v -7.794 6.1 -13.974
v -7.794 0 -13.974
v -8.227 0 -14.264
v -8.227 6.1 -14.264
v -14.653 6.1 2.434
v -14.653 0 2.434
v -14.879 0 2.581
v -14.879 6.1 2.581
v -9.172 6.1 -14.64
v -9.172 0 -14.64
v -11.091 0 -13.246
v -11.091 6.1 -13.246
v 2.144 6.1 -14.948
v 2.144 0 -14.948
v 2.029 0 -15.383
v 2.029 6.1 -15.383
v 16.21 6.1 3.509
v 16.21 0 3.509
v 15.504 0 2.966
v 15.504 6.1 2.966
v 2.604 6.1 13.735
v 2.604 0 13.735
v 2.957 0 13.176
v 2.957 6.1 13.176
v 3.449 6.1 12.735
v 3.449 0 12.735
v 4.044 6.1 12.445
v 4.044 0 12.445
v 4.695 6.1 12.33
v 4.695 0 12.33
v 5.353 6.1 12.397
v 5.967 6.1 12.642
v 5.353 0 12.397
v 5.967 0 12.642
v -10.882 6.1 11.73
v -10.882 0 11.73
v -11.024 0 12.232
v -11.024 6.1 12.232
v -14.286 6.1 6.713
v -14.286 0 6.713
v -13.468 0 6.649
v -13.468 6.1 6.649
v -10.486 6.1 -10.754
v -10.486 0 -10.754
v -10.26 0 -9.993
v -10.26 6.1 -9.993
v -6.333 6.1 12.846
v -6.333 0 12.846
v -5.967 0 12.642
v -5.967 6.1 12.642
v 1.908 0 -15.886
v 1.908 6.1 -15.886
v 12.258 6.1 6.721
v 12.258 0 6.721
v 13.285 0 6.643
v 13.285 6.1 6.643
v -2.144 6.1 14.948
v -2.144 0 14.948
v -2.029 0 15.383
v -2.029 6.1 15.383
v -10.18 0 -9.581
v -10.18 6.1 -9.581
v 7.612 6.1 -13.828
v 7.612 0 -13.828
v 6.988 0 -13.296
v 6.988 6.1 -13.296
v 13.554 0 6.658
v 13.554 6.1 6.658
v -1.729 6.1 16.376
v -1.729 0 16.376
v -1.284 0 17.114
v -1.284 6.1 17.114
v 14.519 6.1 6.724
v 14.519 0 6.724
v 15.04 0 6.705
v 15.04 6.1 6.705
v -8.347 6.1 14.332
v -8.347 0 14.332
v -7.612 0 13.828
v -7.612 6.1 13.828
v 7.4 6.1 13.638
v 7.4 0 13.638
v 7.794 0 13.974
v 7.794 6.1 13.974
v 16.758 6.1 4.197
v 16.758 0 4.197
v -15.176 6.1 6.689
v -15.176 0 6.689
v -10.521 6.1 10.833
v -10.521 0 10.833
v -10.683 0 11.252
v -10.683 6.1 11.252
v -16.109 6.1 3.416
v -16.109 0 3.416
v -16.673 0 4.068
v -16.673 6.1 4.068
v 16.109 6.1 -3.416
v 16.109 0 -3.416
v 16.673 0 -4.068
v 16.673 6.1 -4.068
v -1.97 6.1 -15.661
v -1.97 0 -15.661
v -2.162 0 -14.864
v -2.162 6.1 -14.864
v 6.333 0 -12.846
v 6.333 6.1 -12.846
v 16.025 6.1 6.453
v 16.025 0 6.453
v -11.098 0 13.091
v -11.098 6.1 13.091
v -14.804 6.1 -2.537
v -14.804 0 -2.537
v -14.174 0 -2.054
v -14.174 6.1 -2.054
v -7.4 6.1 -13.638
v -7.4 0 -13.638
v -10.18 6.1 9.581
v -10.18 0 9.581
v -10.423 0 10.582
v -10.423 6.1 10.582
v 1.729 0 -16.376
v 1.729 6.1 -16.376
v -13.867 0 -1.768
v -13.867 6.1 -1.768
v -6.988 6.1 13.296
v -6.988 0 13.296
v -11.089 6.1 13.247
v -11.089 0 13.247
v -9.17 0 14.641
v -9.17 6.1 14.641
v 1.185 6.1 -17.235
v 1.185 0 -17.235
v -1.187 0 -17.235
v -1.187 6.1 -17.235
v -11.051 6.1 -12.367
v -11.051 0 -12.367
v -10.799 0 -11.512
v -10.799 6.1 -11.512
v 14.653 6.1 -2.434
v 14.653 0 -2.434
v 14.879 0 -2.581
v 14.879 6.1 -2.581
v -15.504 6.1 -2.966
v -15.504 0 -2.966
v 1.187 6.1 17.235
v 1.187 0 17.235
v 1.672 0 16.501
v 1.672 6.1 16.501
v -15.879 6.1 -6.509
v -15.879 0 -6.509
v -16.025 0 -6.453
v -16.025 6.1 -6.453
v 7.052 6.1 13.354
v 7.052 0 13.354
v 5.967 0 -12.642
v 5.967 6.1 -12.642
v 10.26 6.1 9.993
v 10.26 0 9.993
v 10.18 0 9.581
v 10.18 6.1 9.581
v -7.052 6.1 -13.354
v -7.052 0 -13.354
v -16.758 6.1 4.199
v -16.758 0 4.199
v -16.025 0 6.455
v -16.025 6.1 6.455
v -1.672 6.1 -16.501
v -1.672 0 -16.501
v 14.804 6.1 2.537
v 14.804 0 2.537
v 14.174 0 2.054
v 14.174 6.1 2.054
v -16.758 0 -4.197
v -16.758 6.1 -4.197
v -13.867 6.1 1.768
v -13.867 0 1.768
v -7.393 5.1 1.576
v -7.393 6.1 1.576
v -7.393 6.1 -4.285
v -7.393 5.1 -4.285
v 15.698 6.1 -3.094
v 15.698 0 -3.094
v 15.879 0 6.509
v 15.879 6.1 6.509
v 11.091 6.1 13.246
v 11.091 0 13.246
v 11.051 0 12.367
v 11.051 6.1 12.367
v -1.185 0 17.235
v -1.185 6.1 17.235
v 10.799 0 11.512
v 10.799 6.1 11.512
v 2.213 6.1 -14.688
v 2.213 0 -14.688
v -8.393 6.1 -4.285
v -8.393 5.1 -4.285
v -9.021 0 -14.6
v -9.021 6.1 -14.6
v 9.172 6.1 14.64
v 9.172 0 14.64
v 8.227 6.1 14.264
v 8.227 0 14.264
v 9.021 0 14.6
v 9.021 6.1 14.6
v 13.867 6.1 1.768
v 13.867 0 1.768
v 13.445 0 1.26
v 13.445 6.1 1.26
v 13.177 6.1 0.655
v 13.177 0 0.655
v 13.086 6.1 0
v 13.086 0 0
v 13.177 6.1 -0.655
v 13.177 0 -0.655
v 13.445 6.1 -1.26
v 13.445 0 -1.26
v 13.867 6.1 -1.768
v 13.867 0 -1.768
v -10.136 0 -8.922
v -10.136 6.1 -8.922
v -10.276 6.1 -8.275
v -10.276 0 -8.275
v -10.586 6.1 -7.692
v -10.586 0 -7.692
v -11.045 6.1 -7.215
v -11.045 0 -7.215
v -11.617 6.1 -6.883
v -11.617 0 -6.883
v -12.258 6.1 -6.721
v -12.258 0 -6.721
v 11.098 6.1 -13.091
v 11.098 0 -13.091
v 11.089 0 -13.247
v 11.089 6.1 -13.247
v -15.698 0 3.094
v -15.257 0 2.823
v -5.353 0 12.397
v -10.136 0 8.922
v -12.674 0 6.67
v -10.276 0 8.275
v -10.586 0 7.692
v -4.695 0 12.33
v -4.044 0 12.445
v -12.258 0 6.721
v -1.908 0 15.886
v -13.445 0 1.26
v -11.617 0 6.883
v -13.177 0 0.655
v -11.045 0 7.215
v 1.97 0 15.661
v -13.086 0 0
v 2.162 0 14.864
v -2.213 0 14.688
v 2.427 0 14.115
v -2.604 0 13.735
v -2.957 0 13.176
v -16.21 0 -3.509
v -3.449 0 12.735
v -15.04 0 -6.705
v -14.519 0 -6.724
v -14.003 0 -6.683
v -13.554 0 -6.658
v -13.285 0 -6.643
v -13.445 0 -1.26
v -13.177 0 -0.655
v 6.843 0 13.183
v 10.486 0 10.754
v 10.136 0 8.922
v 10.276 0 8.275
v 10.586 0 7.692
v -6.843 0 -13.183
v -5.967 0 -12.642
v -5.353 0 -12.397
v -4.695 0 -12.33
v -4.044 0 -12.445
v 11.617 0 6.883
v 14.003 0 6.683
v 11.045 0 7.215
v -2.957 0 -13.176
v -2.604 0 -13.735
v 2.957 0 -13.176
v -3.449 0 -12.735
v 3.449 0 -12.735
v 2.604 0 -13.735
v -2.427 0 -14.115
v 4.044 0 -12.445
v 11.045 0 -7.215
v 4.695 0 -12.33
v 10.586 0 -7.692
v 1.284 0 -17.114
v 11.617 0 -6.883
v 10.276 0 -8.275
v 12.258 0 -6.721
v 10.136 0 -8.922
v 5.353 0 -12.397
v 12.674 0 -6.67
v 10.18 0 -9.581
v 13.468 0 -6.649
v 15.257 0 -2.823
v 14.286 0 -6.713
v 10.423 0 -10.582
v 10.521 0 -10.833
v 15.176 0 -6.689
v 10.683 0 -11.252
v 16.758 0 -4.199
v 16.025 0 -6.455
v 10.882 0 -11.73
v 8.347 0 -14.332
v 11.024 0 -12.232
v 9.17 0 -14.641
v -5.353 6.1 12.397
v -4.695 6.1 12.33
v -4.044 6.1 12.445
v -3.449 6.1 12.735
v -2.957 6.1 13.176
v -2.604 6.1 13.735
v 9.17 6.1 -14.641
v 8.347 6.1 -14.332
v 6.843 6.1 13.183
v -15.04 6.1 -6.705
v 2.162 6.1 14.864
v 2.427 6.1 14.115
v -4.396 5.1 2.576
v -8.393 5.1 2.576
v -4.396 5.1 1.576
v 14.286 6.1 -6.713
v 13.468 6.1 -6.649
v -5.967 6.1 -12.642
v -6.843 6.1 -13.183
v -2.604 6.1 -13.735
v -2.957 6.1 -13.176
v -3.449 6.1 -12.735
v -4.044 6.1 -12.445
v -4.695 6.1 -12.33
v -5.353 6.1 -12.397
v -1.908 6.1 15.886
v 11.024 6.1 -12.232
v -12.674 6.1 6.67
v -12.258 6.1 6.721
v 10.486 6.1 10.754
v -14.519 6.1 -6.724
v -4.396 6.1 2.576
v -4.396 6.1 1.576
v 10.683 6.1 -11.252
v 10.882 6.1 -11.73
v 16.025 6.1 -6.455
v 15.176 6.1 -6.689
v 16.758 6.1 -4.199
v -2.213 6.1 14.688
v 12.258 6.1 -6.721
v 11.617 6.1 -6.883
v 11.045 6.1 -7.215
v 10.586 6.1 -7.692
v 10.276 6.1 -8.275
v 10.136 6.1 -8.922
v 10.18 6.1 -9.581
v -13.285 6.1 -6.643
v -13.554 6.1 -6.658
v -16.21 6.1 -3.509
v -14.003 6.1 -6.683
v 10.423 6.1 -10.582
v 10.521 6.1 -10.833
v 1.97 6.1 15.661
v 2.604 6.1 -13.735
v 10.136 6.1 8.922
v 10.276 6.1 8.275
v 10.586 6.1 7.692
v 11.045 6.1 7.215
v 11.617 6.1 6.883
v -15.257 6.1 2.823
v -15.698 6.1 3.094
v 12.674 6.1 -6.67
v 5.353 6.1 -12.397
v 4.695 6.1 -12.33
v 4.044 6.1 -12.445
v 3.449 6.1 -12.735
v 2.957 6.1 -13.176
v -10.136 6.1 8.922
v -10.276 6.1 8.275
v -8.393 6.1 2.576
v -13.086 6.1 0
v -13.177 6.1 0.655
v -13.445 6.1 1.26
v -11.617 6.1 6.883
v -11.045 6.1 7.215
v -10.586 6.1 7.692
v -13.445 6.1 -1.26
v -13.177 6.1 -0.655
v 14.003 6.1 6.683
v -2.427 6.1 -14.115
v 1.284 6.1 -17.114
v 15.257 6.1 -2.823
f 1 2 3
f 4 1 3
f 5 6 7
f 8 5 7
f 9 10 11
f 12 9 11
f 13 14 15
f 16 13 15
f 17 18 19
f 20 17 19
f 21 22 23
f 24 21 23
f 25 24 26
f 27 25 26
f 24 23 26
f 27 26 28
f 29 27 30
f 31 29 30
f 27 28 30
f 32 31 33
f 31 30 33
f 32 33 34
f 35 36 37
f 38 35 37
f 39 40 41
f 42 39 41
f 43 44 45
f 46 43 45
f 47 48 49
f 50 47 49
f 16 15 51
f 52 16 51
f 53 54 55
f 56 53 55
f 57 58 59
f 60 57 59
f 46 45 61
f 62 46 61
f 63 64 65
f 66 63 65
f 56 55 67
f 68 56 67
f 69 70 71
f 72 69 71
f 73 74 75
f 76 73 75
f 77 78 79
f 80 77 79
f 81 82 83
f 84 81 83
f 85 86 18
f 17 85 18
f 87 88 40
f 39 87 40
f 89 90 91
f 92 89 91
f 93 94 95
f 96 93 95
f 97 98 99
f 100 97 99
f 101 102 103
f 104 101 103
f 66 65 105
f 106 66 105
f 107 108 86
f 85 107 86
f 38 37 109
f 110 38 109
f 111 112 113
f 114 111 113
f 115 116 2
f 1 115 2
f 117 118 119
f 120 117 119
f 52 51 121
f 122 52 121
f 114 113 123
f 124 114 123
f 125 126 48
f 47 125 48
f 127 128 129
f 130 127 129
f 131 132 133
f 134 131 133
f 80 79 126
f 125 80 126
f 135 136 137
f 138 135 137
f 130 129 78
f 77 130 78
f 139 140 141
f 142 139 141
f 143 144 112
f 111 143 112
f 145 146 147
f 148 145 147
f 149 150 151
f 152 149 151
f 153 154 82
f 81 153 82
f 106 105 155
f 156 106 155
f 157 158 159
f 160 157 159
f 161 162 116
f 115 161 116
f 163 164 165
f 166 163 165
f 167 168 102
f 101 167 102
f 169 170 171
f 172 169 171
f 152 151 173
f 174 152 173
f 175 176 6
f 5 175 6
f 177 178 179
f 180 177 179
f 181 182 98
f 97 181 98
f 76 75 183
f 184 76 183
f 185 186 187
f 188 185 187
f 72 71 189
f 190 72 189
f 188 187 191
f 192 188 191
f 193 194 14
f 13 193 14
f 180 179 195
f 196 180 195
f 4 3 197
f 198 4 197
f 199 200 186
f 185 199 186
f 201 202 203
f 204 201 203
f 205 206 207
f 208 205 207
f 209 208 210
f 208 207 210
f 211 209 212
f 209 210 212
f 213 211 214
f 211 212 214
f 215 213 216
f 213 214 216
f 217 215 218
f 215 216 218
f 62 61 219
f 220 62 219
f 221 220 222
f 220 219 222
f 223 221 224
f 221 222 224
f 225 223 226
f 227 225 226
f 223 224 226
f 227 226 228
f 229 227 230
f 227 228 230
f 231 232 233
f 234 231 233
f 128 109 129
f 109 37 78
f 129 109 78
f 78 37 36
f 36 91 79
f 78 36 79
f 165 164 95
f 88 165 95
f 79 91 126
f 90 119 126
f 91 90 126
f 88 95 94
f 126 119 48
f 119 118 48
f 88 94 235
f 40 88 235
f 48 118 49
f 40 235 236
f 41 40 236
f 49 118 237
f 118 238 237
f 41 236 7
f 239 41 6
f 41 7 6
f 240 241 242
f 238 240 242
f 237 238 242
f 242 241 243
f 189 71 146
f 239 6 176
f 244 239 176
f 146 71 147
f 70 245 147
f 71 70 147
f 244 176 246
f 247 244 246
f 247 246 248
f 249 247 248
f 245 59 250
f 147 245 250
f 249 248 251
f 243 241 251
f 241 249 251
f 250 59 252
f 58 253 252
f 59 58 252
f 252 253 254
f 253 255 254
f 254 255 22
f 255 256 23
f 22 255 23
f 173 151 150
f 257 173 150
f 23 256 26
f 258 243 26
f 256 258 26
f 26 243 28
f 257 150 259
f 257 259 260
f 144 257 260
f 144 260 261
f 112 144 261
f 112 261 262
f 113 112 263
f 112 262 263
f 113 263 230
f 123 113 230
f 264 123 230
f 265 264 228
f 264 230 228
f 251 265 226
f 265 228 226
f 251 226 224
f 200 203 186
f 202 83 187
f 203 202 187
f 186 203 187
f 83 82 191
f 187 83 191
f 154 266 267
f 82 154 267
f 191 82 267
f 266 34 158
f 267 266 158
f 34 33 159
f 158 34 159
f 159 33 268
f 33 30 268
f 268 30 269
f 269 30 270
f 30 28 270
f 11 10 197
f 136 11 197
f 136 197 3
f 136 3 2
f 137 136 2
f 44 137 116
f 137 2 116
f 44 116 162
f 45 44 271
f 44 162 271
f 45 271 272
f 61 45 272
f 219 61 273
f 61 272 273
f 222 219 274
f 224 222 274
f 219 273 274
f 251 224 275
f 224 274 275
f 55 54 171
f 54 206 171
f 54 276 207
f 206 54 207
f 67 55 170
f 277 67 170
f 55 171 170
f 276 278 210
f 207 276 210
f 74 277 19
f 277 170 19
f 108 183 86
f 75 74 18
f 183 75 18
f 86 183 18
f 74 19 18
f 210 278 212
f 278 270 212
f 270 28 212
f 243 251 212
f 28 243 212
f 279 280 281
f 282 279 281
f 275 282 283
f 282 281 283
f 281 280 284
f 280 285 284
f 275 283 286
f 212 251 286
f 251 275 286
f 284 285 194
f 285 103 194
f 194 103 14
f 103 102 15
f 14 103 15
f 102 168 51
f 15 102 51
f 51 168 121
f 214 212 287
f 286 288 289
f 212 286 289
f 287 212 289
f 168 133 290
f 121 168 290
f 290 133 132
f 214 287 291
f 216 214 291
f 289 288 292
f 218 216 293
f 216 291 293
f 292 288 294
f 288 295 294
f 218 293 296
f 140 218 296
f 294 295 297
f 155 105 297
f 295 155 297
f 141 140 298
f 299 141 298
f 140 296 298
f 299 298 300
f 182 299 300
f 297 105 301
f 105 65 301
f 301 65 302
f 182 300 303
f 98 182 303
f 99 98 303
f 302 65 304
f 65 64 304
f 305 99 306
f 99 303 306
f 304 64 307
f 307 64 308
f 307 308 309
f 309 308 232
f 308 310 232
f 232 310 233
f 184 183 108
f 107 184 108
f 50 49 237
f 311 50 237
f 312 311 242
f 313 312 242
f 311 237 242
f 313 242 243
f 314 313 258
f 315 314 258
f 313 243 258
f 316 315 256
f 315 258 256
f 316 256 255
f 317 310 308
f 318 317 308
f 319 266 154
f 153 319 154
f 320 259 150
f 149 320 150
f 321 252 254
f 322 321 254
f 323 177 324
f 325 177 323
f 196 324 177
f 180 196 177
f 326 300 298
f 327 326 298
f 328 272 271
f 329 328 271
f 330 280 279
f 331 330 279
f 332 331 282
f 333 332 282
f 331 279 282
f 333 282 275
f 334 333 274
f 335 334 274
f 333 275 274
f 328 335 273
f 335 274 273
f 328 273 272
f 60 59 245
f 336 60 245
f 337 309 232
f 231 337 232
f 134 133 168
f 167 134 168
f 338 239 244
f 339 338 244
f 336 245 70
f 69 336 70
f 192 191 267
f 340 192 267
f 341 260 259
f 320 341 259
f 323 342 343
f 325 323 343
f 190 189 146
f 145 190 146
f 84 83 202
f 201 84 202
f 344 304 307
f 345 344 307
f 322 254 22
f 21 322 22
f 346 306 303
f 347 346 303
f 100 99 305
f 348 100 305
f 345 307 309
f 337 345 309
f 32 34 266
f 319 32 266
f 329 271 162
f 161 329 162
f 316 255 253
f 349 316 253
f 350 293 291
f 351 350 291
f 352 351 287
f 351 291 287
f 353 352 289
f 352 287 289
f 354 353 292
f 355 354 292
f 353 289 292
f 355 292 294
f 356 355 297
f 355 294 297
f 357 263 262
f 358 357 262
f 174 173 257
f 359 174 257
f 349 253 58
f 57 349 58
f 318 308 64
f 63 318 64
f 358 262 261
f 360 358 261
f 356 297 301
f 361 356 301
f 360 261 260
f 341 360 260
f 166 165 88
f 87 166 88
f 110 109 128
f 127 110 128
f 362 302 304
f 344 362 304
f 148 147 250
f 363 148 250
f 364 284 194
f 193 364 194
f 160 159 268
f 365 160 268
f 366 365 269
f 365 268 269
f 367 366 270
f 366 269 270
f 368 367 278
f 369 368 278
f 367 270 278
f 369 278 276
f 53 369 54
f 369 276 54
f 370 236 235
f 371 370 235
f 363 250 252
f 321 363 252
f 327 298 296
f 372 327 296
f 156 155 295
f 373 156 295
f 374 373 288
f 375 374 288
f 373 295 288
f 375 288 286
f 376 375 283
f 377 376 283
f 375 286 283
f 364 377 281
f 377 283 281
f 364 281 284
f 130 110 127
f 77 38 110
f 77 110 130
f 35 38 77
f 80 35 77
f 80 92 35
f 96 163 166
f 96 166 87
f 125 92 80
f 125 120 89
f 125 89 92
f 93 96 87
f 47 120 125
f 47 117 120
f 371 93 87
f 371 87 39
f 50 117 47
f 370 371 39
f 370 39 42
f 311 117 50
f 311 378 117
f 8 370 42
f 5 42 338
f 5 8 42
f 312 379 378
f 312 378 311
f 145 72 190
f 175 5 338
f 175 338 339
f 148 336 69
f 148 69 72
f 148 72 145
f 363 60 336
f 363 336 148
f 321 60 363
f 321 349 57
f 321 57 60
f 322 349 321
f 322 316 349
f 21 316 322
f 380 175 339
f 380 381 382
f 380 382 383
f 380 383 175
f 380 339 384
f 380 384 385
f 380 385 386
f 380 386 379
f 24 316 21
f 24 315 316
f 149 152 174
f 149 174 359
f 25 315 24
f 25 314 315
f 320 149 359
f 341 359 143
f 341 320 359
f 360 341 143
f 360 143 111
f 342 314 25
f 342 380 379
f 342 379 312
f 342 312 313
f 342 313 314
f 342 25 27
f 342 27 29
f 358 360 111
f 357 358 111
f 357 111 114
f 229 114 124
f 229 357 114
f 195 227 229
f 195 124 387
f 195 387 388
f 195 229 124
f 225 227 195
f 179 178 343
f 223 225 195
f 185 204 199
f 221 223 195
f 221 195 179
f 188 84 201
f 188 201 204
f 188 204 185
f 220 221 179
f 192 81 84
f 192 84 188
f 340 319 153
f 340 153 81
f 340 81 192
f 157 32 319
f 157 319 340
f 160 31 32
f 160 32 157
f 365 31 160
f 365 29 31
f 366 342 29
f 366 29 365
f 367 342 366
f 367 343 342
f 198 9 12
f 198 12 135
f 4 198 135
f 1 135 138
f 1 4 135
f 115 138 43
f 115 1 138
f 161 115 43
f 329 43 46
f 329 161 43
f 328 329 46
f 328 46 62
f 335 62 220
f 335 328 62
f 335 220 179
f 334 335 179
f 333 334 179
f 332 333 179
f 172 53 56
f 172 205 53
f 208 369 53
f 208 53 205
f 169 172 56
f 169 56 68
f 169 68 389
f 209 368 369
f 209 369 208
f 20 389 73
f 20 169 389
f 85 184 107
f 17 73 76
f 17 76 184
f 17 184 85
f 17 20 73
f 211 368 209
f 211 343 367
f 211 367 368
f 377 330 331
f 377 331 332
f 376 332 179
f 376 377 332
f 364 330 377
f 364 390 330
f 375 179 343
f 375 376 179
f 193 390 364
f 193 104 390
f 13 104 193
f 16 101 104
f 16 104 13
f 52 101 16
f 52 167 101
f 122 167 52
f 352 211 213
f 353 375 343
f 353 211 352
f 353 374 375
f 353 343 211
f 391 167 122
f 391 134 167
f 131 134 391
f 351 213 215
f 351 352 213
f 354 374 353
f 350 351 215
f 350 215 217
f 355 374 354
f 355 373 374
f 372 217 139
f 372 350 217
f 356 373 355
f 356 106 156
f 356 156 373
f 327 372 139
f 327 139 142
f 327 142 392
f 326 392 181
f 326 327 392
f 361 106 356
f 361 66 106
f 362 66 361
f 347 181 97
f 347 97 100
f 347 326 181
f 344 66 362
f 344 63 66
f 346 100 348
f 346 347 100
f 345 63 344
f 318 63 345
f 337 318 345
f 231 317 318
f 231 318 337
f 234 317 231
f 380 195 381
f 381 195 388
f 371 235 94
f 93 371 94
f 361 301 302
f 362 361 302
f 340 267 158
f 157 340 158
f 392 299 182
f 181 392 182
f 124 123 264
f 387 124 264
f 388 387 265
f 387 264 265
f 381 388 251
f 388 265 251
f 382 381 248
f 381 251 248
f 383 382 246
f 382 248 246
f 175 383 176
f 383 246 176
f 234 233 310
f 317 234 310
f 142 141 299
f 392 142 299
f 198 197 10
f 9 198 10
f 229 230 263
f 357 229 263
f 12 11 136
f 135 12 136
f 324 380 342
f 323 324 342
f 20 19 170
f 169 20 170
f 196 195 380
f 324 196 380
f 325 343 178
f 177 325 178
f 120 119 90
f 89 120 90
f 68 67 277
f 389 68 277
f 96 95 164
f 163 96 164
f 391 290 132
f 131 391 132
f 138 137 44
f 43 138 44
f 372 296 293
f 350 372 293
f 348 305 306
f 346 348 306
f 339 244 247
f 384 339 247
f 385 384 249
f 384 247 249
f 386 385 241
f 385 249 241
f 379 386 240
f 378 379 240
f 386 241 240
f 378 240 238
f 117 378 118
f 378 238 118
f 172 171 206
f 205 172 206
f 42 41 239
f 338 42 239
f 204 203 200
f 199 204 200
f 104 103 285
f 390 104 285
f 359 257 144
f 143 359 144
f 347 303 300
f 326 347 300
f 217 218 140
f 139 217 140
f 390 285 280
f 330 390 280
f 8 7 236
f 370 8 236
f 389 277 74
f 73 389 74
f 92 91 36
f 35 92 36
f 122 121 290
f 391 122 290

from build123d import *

# Parameters (mm, degrees)
BOSS_EXTRUDE1_DEPTH = 6.1
CUT_EXTRUDE1_DEPTH  = 1


with BuildPart() as part:
    # Sketch1 → Boss-Extrude1 (new body)
    with BuildSketch(Plane(origin=(0, 0, 0), x_dir=(1, 0, 0), z_dir=(0, 1, 0))):
        with BuildLine():
            ThreePointArc((-2.603734293, 13.735096717), (-4.043681259, 12.445171239), (-5.966821997, 12.642363282))
            Line((-5.966821997, 12.642363282), (-6.843279813, 13.183422247))
            Line((-6.843279813, 13.183422247), (-7.052164592, 13.353548445))
            Line((-7.052164592, 13.353548445), (-7.399861002, 13.637560961))
            Line((-7.399861002, 13.637560961), (-7.793732744, 13.973879308))
            Line((-7.793732744, 13.973879308), (-8.226942264, 14.264456075))
            Line((-8.226942264, 14.264456075), (-9.020650473, 14.599698524))
            Line((-9.020650473, 14.599698524), (-9.172029908, 14.639881345))
            Line((-9.172029908, 14.639881345), (-11.091125587, 13.245576719))
            Line((-11.091125587, 13.245576719), (-11.051137643, 12.366770586))
            Line((-11.051137643, 12.366770586), (-10.799290258, 11.512249619))
            Line((-10.799290258, 11.512249619), (-10.485832024, 10.75420757))
            Line((-10.485832024, 10.75420757), (-10.259959226, 9.993083115))
            Line((-10.259959226, 9.993083115), (-10.179752581, 9.581490045))
            ThreePointArc((-10.179752581, 9.581490045), (-10.586494975, 7.691538822), (-12.258255089, 6.720676771))
            Line((-12.258255089, 6.720676771), (-13.285350838, 6.643233691))
            Line((-13.285350838, 6.643233691), (-13.554339843, 6.658089283))
            Line((-13.554339843, 6.658089283), (-14.002570517, 6.683489414))
            Line((-14.002570517, 6.683489414), (-14.518902414, 6.72406467))
            Line((-14.518902414, 6.72406467), (-15.040173016, 6.704512046))
            Line((-15.040173016, 6.704512046), (-15.879347013, 6.509198904))
            Line((-15.879347013, 6.509198904), (-16.025434419, 6.452728891))
            Line((-16.025434419, 6.452728891), (-16.75846374, 4.196696614))
            Line((-16.75846374, 4.196696614), (-16.20956353, 3.509231842))
            Line((-16.20956353, 3.509231842), (-15.503539893, 2.965942036))
            Line((-15.503539893, 2.965942036), (-14.804380918, 2.536919263))
            Line((-14.804380918, 2.536919263), (-14.174268255, 2.053921344))
            Line((-14.174268255, 2.053921344), (-13.86745138, 1.768079839))
            ThreePointArc((-13.86745138, 1.768079839), (-13.085627432, 0), (-13.86745138, -1.768079839))
            Line((-13.86745138, -1.768079839), (-14.652869395, -2.434444341))
            Line((-14.652869395, -2.434444341), (-14.87921797, -2.580533684))
            Line((-14.87921797, -2.580533684), (-15.256774024, -2.823447927))
            Line((-15.256774024, -2.823447927), (-15.698344841, -3.094114129))
            Line((-15.698344841, -3.094114129), (-16.108568873, -3.416327706))
            Line((-16.108568873, -3.416327706), (-16.672672713, -4.067593457))
            Line((-16.672672713, -4.067593457), (-16.757667666, -4.19914668))
            Line((-16.757667666, -4.19914668), (-16.024638344, -6.455178957))
            Line((-16.024638344, -6.455178957), (-15.176487091, -6.688714191))
            Line((-15.176487091, -6.688714191), (-14.285964235, -6.713254596))
            Line((-14.285964235, -6.713254596), (-13.468159483, -6.649385976))
            Line((-13.468159483, -6.649385976), (-12.674488577, -6.66976857))
            Line((-12.674488577, -6.66976857), (-12.258255089, -6.720676771))
            ThreePointArc((-12.258255089, -6.720676771), (-10.586494975, -7.691538822), (-10.179752581, -9.581490045))
            Line((-10.179752581, -9.581490045), (-10.423489876, -10.582247377))
            Line((-10.423489876, -10.582247377), (-10.520740558, -10.833480493))
            Line((-10.520740558, -10.833480493), (-10.683408413, -11.251924125))
            Line((-10.683408413, -11.251924125), (-10.881553106, -11.730446496))
            Line((-10.881553106, -11.730446496), (-11.02403893, -12.232246392))
            Line((-11.02403893, -12.232246392), (-11.09760412, -13.09070337))
            Line((-11.09760412, -13.09070337), (-11.089041437, -13.247090943))
            Line((-11.089041437, -13.247090943), (-9.169945757, -14.641395569))
            Line((-9.169945757, -14.641395569), (-8.346508413, -14.331798745))
            Line((-8.346508413, -14.331798745), (-7.611635801, -13.828216148))
            Line((-7.611635801, -13.828216148), (-6.987558891, -13.295851776))
            Line((-6.987558891, -13.295851776), (-6.333485052, -12.845833588))
            Line((-6.333485052, -12.845833588), (-5.966821997, -12.642363282))
            ThreePointArc((-5.966821997, -12.642363282), (-4.043681259, -12.445171239), (-2.603734293, -13.735096717))
            Line((-2.603734293, -13.735096717), (-2.212691506, -14.687991594))
            Line((-2.212691506, -14.687991594), (-2.14369784, -14.94840597))
            Line((-2.14369784, -14.94840597), (-2.029343904, -15.382547746))
            Line((-2.029343904, -15.382547746), (-1.908377935, -15.886147005))
            Line((-1.908377935, -15.886147005), (-1.72870081, -16.375862714))
            Line((-1.72870081, -16.375862714), (-1.283627947, -17.113609532))
            Line((-1.283627947, -17.113609532), (-1.184778282, -17.235096718))
            Line((-1.184778282, -17.235096718), (1.187354434, -17.235096718))
            Line((1.187354434, -17.235096718), (1.671552791, -16.500623298))
            Line((1.671552791, -16.500623298), (1.970078799, -15.661269135))
            Line((1.970078799, -15.661269135), (2.162051698, -14.863754107))
            Line((2.162051698, -14.863754107), (2.426694495, -14.115226788))
            Line((2.426694495, -14.115226788), (2.603734293, -13.735096717))
            ThreePointArc((2.603734293, -13.735096717), (4.043681259, -12.445171239), (5.966821997, -12.642363282))
            Line((5.966821997, -12.642363282), (6.843279813, -13.183422247))
            Line((6.843279813, -13.183422247), (7.052164592, -13.353548445))
            Line((7.052164592, -13.353548445), (7.399861002, -13.637560961))
            Line((7.399861002, -13.637560961), (7.793732744, -13.973879308))
            Line((7.793732744, -13.973879308), (8.226942264, -14.264456075))
            Line((8.226942264, -14.264456075), (9.020650473, -14.599698524))
            Line((9.020650473, -14.599698524), (9.172029908, -14.639881345))
            Line((9.172029908, -14.639881345), (11.091125587, -13.245576719))
            Line((11.091125587, -13.245576719), (11.051137643, -12.366770586))
            Line((11.051137643, -12.366770586), (10.799290258, -11.512249619))
            Line((10.799290258, -11.512249619), (10.485832024, -10.75420757))
            Line((10.485832024, -10.75420757), (10.259959226, -9.993083115))
            Line((10.259959226, -9.993083115), (10.179752581, -9.581490045))
            ThreePointArc((10.179752581, -9.581490045), (10.586494975, -7.691538822), (12.258255089, -6.720676771))
            Line((12.258255089, -6.720676771), (13.285350838, -6.643233691))
            Line((13.285350838, -6.643233691), (13.554339843, -6.658089283))
            Line((13.554339843, -6.658089283), (14.002570517, -6.683489414))
            Line((14.002570517, -6.683489414), (14.518902414, -6.72406467))
            Line((14.518902414, -6.72406467), (15.040173016, -6.704512046))
            Line((15.040173016, -6.704512046), (15.879347013, -6.509198904))
            Line((15.879347013, -6.509198904), (16.025434419, -6.452728891))
            Line((16.025434419, -6.452728891), (16.75846374, -4.196696614))
            Line((16.75846374, -4.196696614), (16.20956353, -3.509231842))
            Line((16.20956353, -3.509231842), (15.503539893, -2.965942036))
            Line((15.503539893, -2.965942036), (14.804380918, -2.536919263))
            Line((14.804380918, -2.536919263), (14.174268255, -2.053921344))
            Line((14.174268255, -2.053921344), (13.86745138, -1.768079839))
            ThreePointArc((13.86745138, -1.768079839), (13.085627432, 0), (13.86745138, 1.768079839))
            Line((13.86745138, 1.768079839), (14.652869395, 2.434444341))
            Line((14.652869395, 2.434444341), (14.87921797, 2.580533684))
            Line((14.87921797, 2.580533684), (15.256774024, 2.823447927))
            Line((15.256774024, 2.823447927), (15.698344841, 3.094114129))
            Line((15.698344841, 3.094114129), (16.108568873, 3.416327706))
            Line((16.108568873, 3.416327706), (16.672672713, 4.067593457))
            Line((16.672672713, 4.067593457), (16.757667666, 4.19914668))
            Line((16.757667666, 4.19914668), (16.024638344, 6.455178957))
            Line((16.024638344, 6.455178957), (15.176487091, 6.688714191))
            Line((15.176487091, 6.688714191), (14.285964235, 6.713254596))
            Line((14.285964235, 6.713254596), (13.468159483, 6.649385976))
            Line((13.468159483, 6.649385976), (12.674488577, 6.66976857))
            Line((12.674488577, 6.66976857), (12.258255089, 6.720676771))
            ThreePointArc((12.258255089, 6.720676771), (10.586494975, 7.691538822), (10.179752581, 9.581490045))
            Line((10.179752581, 9.581490045), (10.423489876, 10.582247377))
            Line((10.423489876, 10.582247377), (10.520740558, 10.833480493))
            Line((10.520740558, 10.833480493), (10.683408413, 11.251924125))
            Line((10.683408413, 11.251924125), (10.881553106, 11.730446496))
            Line((10.881553106, 11.730446496), (11.02403893, 12.232246392))
            Line((11.02403893, 12.232246392), (11.09760412, 13.09070337))
            Line((11.09760412, 13.09070337), (11.089041437, 13.247090943))
            Line((11.089041437, 13.247090943), (9.169945757, 14.641395569))
            Line((9.169945757, 14.641395569), (8.346508413, 14.331798745))
            Line((8.346508413, 14.331798745), (7.611635801, 13.828216148))
            Line((7.611635801, 13.828216148), (6.987558891, 13.295851776))
            Line((6.987558891, 13.295851776), (6.333485052, 12.845833588))
            Line((6.333485052, 12.845833588), (5.966821997, 12.642363282))
            ThreePointArc((5.966821997, 12.642363282), (4.043681259, 12.445171239), (2.603734293, 13.735096717))
            Line((2.603734293, 13.735096717), (2.212691506, 14.687991594))
            Line((2.212691506, 14.687991594), (2.14369784, 14.94840597))
            Line((2.14369784, 14.94840597), (2.029343904, 15.382547746))
            Line((2.029343904, 15.382547746), (1.908377935, 15.886147005))
            Line((1.908377935, 15.886147005), (1.72870081, 16.375862714))
            Line((1.72870081, 16.375862714), (1.283627947, 17.113609532))
            Line((1.283627947, 17.113609532), (1.184778282, 17.235096718))
            Line((1.184778282, 17.235096718), (-1.187354434, 17.235096718))
            Line((-1.187354434, 17.235096718), (-1.671552791, 16.500623298))
            Line((-1.671552791, 16.500623298), (-1.970078799, 15.661269135))
            Line((-1.970078799, 15.661269135), (-2.162051698, 14.863754107))
            Line((-2.162051698, 14.863754107), (-2.426694495, 14.115226788))
            Line((-2.426694495, 14.115226788), (-2.603734293, 13.735096717))
        make_face()
    extrude(amount=BOSS_EXTRUDE1_DEPTH)

    # Sketch3 → Cut-Extrude1 (cut)
    with BuildSketch(Plane(origin=(0, 6.1, 0), x_dir=(1, 0, 0), z_dir=(0, 1, 0))):
        Polygon((-8.393092124, 4.285361852), (-8.393092124, -2.575657901), (-4.396381589, -2.575657901), (-4.396381589, -1.575657901), (-7.393092124, -1.575657901), (-7.393092124, 4.285361852), align=None)
    extrude(amount=-CUT_EXTRUDE1_DEPTH, mode=Mode.SUBTRACT)


solid = part.part
